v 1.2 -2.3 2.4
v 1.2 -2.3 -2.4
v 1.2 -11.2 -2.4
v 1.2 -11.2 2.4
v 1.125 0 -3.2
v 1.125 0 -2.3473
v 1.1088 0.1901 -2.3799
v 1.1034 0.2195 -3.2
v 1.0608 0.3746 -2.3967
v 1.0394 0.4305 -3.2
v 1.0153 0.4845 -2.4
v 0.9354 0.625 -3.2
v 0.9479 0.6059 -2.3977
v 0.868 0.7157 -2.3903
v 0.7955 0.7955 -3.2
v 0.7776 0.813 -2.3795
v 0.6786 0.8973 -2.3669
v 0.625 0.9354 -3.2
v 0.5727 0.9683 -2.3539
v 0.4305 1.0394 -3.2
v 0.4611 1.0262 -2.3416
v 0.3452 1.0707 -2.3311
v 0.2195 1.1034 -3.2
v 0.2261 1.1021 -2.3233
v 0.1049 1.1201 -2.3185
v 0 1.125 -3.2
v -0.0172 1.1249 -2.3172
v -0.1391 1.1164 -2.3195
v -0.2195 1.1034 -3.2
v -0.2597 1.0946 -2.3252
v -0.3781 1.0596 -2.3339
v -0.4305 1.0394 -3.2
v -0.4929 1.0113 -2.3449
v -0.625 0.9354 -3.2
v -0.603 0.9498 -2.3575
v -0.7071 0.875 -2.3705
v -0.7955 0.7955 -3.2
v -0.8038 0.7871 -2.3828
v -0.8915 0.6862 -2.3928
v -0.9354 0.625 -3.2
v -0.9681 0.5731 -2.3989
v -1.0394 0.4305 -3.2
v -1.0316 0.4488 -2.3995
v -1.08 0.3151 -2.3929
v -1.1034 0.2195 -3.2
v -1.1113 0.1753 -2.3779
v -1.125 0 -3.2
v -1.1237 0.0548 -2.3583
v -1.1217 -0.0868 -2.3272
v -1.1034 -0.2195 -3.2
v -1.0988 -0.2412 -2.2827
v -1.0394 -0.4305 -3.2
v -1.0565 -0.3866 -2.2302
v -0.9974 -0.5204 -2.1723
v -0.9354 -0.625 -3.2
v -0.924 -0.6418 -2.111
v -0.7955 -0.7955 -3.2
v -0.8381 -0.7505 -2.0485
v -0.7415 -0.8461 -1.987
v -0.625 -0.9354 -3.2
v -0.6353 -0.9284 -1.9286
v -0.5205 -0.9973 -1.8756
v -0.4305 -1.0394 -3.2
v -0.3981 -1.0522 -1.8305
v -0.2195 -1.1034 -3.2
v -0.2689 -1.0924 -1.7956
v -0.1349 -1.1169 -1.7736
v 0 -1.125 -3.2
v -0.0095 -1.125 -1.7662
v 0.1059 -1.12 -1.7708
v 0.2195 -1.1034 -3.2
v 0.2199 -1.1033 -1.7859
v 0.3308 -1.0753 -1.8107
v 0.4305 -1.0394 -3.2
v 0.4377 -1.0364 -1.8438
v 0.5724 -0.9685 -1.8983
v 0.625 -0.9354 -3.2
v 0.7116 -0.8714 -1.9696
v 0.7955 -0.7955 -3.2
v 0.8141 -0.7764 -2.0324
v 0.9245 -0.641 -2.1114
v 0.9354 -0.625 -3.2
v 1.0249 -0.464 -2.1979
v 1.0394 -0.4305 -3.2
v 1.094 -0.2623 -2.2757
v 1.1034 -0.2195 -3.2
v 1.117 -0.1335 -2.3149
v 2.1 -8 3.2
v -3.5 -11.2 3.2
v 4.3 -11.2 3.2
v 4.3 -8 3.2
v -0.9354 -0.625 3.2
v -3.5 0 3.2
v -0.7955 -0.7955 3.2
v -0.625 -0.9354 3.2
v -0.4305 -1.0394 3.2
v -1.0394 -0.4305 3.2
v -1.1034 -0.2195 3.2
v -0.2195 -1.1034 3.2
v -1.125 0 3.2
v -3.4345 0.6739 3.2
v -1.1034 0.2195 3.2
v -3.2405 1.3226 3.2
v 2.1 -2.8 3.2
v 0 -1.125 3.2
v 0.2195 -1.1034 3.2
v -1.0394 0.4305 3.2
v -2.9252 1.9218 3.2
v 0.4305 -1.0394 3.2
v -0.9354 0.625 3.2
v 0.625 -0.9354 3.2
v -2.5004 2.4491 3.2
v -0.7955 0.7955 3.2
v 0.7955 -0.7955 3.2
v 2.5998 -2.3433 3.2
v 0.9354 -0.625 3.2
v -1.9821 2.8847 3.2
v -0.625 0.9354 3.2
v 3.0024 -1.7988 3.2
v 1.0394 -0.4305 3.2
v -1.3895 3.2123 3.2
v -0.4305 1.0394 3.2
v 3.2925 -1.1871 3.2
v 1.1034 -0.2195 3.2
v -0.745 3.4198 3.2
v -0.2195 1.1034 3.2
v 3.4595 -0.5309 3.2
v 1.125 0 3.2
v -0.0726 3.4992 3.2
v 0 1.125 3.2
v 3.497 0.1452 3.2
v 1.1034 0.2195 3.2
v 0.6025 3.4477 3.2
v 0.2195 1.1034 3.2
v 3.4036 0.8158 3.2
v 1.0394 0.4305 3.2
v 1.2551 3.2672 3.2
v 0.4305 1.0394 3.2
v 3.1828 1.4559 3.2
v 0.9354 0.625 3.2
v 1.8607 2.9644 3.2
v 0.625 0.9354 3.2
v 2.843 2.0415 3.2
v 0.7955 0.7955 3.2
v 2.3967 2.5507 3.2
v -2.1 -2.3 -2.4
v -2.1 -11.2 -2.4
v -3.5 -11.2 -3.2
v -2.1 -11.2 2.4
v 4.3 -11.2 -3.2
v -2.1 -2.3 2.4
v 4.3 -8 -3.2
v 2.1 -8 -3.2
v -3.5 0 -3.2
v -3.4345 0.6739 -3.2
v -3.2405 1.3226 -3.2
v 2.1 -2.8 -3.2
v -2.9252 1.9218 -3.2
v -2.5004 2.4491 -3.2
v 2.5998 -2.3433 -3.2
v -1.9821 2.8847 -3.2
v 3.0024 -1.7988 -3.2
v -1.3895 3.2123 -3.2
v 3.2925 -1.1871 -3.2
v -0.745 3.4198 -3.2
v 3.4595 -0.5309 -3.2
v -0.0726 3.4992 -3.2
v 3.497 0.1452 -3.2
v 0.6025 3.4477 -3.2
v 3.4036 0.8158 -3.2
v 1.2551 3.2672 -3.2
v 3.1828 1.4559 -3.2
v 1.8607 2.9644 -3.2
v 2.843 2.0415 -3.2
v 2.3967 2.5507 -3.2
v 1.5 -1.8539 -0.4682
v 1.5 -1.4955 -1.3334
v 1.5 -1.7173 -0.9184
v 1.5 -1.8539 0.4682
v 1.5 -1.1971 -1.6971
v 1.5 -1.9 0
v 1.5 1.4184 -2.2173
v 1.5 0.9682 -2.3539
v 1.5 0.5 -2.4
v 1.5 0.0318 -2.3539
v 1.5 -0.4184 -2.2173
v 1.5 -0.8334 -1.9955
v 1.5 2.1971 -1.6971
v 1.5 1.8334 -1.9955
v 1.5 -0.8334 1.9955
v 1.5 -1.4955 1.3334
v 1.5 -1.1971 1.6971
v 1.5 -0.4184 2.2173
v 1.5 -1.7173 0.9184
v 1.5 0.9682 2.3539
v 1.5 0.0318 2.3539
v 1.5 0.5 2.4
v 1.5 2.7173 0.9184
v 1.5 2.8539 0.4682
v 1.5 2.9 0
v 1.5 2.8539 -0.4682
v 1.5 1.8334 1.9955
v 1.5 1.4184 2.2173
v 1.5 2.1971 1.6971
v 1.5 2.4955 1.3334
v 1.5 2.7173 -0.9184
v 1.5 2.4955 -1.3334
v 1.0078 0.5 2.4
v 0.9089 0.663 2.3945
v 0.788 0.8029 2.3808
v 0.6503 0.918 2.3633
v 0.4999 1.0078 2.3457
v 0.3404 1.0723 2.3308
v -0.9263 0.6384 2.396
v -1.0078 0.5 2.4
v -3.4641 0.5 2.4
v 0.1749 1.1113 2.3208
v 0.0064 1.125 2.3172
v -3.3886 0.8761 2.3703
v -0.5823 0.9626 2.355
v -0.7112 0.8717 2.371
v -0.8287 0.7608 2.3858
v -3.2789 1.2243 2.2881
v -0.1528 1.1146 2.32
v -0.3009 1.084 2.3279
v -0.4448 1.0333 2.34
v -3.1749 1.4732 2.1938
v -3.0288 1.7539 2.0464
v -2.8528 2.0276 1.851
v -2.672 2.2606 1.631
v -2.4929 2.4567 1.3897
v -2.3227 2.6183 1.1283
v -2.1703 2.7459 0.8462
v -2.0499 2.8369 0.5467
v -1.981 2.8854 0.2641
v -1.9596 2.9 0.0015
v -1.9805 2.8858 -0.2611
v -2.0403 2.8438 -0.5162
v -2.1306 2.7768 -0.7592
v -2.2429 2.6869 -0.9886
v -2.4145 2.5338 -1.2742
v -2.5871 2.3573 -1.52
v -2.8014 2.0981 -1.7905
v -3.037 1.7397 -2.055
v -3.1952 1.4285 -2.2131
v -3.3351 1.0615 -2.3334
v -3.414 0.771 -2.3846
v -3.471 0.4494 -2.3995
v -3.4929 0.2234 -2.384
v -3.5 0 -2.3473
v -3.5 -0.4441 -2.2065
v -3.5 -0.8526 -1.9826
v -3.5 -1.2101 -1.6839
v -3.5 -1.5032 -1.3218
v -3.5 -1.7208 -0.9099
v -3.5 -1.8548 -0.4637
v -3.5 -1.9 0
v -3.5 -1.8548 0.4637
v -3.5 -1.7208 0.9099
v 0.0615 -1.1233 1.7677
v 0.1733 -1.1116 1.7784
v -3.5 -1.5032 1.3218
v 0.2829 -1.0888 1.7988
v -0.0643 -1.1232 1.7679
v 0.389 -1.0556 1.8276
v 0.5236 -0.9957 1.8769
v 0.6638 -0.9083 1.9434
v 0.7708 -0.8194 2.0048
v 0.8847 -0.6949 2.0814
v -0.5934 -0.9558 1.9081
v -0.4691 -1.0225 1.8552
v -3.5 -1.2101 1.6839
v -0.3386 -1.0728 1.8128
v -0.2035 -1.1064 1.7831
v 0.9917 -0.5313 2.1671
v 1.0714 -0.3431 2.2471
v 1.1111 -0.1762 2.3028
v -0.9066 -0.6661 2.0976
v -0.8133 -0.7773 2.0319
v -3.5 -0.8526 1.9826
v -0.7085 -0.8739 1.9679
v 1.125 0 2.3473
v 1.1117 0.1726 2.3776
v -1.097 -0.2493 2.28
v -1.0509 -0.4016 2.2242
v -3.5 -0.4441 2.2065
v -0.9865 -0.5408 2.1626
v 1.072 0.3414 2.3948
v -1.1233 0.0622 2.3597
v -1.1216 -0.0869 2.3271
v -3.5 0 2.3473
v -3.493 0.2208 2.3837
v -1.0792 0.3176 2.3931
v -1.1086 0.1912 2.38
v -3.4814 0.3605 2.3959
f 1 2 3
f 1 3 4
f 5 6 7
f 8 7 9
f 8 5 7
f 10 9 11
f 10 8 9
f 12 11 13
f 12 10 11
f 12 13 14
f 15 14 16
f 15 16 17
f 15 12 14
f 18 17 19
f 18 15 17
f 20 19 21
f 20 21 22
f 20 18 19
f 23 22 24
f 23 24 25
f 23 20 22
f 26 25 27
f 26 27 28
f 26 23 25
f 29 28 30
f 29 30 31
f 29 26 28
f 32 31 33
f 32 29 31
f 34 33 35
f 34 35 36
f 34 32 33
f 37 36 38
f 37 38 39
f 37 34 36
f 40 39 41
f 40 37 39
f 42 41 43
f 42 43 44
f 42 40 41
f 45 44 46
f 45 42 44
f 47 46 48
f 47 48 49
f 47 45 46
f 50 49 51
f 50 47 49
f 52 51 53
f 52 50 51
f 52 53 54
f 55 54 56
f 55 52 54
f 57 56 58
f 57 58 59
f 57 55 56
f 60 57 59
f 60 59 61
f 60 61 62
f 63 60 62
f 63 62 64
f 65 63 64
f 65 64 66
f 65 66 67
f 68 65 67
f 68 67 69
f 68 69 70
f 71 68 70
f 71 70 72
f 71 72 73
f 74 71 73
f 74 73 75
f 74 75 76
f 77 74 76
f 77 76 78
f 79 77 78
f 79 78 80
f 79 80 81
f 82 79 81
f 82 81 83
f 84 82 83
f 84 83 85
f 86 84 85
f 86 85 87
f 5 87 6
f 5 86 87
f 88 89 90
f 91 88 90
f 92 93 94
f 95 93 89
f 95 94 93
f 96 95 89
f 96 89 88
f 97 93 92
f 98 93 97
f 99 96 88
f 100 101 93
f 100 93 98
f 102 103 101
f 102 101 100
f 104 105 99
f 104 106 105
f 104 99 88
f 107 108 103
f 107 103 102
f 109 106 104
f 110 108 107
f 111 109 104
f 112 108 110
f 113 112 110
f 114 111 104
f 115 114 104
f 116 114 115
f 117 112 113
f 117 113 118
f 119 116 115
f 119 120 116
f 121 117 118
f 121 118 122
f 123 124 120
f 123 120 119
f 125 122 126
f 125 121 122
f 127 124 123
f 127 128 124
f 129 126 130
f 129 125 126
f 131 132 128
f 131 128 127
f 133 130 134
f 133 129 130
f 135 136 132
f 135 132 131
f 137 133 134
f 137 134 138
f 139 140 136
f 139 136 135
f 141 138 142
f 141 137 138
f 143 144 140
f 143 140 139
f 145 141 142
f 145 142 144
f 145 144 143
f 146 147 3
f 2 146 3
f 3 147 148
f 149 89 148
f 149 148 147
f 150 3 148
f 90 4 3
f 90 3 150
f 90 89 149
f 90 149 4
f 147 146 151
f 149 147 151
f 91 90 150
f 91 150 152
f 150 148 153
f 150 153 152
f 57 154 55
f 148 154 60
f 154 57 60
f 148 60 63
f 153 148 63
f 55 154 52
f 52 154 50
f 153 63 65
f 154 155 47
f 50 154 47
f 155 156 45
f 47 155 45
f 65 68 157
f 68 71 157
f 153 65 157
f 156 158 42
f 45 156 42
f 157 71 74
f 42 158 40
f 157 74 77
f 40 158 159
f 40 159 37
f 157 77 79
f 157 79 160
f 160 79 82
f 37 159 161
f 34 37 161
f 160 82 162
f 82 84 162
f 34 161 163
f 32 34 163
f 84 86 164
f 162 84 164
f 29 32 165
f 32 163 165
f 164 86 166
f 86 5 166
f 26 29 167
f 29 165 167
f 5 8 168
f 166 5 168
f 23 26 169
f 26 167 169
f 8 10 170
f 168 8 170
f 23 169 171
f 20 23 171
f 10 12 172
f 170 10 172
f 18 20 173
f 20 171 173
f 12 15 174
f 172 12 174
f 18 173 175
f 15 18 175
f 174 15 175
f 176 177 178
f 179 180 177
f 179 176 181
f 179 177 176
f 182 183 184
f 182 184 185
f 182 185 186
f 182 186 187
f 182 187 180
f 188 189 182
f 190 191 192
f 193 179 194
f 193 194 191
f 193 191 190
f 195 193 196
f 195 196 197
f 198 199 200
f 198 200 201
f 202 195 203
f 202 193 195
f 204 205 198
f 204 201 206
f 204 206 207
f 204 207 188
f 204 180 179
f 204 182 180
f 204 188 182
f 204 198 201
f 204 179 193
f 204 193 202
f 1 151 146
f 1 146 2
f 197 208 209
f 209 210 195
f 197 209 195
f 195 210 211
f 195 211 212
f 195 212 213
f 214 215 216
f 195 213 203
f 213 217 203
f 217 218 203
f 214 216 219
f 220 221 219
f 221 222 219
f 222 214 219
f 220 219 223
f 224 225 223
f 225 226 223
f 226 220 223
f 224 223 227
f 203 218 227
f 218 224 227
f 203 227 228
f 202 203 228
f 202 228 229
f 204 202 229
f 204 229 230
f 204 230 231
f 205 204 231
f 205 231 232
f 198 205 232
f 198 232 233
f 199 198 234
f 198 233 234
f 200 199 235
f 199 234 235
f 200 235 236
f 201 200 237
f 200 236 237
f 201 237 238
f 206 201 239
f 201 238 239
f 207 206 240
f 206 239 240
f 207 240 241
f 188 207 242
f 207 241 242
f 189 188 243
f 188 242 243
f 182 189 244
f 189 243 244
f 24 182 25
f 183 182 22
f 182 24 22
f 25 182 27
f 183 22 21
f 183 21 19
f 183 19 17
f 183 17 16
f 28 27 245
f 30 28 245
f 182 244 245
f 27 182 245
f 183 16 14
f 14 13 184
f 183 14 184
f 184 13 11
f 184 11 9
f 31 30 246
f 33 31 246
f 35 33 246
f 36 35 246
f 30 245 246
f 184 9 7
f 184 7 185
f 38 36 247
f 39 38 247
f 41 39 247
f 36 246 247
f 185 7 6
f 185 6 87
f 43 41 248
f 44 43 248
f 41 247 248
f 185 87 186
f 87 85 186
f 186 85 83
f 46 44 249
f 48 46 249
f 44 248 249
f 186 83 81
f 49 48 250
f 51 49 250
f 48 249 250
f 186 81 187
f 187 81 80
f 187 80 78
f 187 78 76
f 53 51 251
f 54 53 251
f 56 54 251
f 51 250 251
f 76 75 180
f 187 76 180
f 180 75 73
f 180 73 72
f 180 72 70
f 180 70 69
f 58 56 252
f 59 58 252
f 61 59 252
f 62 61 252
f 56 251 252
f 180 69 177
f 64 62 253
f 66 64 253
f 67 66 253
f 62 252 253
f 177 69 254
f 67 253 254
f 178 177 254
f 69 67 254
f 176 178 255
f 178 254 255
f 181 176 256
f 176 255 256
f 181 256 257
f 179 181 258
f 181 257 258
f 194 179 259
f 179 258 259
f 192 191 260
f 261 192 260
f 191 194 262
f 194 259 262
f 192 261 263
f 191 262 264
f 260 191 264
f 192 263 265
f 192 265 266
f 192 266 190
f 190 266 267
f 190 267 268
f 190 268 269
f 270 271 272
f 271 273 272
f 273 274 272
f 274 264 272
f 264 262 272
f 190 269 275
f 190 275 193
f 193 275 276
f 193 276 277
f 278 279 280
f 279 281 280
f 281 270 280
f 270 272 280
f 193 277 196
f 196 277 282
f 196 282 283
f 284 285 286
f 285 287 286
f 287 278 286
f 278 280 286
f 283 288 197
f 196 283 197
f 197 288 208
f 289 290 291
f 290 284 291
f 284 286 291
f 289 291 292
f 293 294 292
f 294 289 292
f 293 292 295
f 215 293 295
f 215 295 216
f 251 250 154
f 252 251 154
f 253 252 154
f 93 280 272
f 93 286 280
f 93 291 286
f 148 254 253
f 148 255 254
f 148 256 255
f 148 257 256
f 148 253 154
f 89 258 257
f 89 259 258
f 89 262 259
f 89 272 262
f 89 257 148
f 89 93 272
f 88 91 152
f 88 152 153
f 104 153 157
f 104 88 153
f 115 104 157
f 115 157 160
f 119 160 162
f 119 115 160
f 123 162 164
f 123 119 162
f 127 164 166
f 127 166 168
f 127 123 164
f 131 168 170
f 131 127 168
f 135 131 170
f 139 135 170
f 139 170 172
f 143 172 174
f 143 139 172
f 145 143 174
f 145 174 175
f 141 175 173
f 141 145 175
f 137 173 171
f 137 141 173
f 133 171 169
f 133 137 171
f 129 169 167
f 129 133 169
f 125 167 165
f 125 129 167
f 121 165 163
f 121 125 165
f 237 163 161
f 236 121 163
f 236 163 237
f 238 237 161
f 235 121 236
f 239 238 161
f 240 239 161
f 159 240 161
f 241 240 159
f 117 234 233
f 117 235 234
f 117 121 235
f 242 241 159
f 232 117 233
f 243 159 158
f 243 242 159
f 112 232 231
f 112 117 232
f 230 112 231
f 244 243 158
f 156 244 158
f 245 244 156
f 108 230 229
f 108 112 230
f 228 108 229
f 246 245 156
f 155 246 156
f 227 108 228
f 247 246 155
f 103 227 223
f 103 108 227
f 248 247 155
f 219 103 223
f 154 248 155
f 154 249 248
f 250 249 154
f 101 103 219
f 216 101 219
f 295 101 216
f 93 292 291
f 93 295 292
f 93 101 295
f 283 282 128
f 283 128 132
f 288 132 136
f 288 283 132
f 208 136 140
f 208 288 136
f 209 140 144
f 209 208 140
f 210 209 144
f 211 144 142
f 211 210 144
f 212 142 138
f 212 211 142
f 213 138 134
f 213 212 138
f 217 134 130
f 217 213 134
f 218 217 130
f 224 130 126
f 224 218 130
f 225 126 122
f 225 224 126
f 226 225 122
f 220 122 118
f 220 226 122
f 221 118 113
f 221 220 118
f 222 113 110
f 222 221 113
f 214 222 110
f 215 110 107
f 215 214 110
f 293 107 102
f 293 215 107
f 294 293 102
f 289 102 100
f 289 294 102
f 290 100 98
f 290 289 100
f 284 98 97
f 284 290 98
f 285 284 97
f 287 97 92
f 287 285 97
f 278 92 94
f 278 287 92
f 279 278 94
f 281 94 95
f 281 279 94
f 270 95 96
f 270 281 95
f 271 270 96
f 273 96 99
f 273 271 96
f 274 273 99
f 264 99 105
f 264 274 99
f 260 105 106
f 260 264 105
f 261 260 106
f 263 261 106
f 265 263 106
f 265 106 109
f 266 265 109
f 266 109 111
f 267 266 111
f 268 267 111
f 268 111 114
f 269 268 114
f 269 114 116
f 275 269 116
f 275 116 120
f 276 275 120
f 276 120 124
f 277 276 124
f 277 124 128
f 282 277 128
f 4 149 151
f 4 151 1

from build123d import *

# Parameters (mm, degrees)
SKETCH1_R           = 1.125
BOSS_EXTRUDE1_DEPTH = 3.2
SKETCH2_W           = 3.3
SKETCH2_H           = 4.8
CUT_EXTRUDE1_DEPTH  = 8.9
SKETCH4_R           = 2.4
CUT_EXTRUDE2_DEPTH  = 5


with BuildPart() as part:
    # Sketch1 → Boss-Extrude1 (new body, symmetric)
    with BuildSketch(Plane.XY):
        with BuildLine():
            Line((-3.5, 0), (-3.5, -11.2))
            Line((-3.5, -11.2), (4.3, -11.2))
            Line((4.3, -11.2), (4.3, -8))
            Line((4.3, -8), (2.1, -8))
            Line((2.1, -8), (2.1, -2.8))
            ThreePointArc((2.1, -2.8), (1.565247584, 3.130495168), (-3.5, 0))
        make_face()
        Circle(SKETCH1_R, mode=Mode.SUBTRACT)
    extrude(amount=BOSS_EXTRUDE1_DEPTH, both=True)

    # Sketch2 → Cut-Extrude1 (cut)
    with BuildSketch(Plane.XZ.offset(11.2)):
        with Locations((-0.45, 0)):
            Rectangle(SKETCH2_W, SKETCH2_H)
    extrude(amount=-CUT_EXTRUDE1_DEPTH, mode=Mode.SUBTRACT)

    # Sketch4 → Cut-Extrude2 (cut)
    with BuildSketch(Plane.ZY.offset(3.5)):
        with Locations((0, 0.5)):
            Circle(SKETCH4_R)
    extrude(amount=-CUT_EXTRUDE2_DEPTH, mode=Mode.SUBTRACT)


solid = part.part
